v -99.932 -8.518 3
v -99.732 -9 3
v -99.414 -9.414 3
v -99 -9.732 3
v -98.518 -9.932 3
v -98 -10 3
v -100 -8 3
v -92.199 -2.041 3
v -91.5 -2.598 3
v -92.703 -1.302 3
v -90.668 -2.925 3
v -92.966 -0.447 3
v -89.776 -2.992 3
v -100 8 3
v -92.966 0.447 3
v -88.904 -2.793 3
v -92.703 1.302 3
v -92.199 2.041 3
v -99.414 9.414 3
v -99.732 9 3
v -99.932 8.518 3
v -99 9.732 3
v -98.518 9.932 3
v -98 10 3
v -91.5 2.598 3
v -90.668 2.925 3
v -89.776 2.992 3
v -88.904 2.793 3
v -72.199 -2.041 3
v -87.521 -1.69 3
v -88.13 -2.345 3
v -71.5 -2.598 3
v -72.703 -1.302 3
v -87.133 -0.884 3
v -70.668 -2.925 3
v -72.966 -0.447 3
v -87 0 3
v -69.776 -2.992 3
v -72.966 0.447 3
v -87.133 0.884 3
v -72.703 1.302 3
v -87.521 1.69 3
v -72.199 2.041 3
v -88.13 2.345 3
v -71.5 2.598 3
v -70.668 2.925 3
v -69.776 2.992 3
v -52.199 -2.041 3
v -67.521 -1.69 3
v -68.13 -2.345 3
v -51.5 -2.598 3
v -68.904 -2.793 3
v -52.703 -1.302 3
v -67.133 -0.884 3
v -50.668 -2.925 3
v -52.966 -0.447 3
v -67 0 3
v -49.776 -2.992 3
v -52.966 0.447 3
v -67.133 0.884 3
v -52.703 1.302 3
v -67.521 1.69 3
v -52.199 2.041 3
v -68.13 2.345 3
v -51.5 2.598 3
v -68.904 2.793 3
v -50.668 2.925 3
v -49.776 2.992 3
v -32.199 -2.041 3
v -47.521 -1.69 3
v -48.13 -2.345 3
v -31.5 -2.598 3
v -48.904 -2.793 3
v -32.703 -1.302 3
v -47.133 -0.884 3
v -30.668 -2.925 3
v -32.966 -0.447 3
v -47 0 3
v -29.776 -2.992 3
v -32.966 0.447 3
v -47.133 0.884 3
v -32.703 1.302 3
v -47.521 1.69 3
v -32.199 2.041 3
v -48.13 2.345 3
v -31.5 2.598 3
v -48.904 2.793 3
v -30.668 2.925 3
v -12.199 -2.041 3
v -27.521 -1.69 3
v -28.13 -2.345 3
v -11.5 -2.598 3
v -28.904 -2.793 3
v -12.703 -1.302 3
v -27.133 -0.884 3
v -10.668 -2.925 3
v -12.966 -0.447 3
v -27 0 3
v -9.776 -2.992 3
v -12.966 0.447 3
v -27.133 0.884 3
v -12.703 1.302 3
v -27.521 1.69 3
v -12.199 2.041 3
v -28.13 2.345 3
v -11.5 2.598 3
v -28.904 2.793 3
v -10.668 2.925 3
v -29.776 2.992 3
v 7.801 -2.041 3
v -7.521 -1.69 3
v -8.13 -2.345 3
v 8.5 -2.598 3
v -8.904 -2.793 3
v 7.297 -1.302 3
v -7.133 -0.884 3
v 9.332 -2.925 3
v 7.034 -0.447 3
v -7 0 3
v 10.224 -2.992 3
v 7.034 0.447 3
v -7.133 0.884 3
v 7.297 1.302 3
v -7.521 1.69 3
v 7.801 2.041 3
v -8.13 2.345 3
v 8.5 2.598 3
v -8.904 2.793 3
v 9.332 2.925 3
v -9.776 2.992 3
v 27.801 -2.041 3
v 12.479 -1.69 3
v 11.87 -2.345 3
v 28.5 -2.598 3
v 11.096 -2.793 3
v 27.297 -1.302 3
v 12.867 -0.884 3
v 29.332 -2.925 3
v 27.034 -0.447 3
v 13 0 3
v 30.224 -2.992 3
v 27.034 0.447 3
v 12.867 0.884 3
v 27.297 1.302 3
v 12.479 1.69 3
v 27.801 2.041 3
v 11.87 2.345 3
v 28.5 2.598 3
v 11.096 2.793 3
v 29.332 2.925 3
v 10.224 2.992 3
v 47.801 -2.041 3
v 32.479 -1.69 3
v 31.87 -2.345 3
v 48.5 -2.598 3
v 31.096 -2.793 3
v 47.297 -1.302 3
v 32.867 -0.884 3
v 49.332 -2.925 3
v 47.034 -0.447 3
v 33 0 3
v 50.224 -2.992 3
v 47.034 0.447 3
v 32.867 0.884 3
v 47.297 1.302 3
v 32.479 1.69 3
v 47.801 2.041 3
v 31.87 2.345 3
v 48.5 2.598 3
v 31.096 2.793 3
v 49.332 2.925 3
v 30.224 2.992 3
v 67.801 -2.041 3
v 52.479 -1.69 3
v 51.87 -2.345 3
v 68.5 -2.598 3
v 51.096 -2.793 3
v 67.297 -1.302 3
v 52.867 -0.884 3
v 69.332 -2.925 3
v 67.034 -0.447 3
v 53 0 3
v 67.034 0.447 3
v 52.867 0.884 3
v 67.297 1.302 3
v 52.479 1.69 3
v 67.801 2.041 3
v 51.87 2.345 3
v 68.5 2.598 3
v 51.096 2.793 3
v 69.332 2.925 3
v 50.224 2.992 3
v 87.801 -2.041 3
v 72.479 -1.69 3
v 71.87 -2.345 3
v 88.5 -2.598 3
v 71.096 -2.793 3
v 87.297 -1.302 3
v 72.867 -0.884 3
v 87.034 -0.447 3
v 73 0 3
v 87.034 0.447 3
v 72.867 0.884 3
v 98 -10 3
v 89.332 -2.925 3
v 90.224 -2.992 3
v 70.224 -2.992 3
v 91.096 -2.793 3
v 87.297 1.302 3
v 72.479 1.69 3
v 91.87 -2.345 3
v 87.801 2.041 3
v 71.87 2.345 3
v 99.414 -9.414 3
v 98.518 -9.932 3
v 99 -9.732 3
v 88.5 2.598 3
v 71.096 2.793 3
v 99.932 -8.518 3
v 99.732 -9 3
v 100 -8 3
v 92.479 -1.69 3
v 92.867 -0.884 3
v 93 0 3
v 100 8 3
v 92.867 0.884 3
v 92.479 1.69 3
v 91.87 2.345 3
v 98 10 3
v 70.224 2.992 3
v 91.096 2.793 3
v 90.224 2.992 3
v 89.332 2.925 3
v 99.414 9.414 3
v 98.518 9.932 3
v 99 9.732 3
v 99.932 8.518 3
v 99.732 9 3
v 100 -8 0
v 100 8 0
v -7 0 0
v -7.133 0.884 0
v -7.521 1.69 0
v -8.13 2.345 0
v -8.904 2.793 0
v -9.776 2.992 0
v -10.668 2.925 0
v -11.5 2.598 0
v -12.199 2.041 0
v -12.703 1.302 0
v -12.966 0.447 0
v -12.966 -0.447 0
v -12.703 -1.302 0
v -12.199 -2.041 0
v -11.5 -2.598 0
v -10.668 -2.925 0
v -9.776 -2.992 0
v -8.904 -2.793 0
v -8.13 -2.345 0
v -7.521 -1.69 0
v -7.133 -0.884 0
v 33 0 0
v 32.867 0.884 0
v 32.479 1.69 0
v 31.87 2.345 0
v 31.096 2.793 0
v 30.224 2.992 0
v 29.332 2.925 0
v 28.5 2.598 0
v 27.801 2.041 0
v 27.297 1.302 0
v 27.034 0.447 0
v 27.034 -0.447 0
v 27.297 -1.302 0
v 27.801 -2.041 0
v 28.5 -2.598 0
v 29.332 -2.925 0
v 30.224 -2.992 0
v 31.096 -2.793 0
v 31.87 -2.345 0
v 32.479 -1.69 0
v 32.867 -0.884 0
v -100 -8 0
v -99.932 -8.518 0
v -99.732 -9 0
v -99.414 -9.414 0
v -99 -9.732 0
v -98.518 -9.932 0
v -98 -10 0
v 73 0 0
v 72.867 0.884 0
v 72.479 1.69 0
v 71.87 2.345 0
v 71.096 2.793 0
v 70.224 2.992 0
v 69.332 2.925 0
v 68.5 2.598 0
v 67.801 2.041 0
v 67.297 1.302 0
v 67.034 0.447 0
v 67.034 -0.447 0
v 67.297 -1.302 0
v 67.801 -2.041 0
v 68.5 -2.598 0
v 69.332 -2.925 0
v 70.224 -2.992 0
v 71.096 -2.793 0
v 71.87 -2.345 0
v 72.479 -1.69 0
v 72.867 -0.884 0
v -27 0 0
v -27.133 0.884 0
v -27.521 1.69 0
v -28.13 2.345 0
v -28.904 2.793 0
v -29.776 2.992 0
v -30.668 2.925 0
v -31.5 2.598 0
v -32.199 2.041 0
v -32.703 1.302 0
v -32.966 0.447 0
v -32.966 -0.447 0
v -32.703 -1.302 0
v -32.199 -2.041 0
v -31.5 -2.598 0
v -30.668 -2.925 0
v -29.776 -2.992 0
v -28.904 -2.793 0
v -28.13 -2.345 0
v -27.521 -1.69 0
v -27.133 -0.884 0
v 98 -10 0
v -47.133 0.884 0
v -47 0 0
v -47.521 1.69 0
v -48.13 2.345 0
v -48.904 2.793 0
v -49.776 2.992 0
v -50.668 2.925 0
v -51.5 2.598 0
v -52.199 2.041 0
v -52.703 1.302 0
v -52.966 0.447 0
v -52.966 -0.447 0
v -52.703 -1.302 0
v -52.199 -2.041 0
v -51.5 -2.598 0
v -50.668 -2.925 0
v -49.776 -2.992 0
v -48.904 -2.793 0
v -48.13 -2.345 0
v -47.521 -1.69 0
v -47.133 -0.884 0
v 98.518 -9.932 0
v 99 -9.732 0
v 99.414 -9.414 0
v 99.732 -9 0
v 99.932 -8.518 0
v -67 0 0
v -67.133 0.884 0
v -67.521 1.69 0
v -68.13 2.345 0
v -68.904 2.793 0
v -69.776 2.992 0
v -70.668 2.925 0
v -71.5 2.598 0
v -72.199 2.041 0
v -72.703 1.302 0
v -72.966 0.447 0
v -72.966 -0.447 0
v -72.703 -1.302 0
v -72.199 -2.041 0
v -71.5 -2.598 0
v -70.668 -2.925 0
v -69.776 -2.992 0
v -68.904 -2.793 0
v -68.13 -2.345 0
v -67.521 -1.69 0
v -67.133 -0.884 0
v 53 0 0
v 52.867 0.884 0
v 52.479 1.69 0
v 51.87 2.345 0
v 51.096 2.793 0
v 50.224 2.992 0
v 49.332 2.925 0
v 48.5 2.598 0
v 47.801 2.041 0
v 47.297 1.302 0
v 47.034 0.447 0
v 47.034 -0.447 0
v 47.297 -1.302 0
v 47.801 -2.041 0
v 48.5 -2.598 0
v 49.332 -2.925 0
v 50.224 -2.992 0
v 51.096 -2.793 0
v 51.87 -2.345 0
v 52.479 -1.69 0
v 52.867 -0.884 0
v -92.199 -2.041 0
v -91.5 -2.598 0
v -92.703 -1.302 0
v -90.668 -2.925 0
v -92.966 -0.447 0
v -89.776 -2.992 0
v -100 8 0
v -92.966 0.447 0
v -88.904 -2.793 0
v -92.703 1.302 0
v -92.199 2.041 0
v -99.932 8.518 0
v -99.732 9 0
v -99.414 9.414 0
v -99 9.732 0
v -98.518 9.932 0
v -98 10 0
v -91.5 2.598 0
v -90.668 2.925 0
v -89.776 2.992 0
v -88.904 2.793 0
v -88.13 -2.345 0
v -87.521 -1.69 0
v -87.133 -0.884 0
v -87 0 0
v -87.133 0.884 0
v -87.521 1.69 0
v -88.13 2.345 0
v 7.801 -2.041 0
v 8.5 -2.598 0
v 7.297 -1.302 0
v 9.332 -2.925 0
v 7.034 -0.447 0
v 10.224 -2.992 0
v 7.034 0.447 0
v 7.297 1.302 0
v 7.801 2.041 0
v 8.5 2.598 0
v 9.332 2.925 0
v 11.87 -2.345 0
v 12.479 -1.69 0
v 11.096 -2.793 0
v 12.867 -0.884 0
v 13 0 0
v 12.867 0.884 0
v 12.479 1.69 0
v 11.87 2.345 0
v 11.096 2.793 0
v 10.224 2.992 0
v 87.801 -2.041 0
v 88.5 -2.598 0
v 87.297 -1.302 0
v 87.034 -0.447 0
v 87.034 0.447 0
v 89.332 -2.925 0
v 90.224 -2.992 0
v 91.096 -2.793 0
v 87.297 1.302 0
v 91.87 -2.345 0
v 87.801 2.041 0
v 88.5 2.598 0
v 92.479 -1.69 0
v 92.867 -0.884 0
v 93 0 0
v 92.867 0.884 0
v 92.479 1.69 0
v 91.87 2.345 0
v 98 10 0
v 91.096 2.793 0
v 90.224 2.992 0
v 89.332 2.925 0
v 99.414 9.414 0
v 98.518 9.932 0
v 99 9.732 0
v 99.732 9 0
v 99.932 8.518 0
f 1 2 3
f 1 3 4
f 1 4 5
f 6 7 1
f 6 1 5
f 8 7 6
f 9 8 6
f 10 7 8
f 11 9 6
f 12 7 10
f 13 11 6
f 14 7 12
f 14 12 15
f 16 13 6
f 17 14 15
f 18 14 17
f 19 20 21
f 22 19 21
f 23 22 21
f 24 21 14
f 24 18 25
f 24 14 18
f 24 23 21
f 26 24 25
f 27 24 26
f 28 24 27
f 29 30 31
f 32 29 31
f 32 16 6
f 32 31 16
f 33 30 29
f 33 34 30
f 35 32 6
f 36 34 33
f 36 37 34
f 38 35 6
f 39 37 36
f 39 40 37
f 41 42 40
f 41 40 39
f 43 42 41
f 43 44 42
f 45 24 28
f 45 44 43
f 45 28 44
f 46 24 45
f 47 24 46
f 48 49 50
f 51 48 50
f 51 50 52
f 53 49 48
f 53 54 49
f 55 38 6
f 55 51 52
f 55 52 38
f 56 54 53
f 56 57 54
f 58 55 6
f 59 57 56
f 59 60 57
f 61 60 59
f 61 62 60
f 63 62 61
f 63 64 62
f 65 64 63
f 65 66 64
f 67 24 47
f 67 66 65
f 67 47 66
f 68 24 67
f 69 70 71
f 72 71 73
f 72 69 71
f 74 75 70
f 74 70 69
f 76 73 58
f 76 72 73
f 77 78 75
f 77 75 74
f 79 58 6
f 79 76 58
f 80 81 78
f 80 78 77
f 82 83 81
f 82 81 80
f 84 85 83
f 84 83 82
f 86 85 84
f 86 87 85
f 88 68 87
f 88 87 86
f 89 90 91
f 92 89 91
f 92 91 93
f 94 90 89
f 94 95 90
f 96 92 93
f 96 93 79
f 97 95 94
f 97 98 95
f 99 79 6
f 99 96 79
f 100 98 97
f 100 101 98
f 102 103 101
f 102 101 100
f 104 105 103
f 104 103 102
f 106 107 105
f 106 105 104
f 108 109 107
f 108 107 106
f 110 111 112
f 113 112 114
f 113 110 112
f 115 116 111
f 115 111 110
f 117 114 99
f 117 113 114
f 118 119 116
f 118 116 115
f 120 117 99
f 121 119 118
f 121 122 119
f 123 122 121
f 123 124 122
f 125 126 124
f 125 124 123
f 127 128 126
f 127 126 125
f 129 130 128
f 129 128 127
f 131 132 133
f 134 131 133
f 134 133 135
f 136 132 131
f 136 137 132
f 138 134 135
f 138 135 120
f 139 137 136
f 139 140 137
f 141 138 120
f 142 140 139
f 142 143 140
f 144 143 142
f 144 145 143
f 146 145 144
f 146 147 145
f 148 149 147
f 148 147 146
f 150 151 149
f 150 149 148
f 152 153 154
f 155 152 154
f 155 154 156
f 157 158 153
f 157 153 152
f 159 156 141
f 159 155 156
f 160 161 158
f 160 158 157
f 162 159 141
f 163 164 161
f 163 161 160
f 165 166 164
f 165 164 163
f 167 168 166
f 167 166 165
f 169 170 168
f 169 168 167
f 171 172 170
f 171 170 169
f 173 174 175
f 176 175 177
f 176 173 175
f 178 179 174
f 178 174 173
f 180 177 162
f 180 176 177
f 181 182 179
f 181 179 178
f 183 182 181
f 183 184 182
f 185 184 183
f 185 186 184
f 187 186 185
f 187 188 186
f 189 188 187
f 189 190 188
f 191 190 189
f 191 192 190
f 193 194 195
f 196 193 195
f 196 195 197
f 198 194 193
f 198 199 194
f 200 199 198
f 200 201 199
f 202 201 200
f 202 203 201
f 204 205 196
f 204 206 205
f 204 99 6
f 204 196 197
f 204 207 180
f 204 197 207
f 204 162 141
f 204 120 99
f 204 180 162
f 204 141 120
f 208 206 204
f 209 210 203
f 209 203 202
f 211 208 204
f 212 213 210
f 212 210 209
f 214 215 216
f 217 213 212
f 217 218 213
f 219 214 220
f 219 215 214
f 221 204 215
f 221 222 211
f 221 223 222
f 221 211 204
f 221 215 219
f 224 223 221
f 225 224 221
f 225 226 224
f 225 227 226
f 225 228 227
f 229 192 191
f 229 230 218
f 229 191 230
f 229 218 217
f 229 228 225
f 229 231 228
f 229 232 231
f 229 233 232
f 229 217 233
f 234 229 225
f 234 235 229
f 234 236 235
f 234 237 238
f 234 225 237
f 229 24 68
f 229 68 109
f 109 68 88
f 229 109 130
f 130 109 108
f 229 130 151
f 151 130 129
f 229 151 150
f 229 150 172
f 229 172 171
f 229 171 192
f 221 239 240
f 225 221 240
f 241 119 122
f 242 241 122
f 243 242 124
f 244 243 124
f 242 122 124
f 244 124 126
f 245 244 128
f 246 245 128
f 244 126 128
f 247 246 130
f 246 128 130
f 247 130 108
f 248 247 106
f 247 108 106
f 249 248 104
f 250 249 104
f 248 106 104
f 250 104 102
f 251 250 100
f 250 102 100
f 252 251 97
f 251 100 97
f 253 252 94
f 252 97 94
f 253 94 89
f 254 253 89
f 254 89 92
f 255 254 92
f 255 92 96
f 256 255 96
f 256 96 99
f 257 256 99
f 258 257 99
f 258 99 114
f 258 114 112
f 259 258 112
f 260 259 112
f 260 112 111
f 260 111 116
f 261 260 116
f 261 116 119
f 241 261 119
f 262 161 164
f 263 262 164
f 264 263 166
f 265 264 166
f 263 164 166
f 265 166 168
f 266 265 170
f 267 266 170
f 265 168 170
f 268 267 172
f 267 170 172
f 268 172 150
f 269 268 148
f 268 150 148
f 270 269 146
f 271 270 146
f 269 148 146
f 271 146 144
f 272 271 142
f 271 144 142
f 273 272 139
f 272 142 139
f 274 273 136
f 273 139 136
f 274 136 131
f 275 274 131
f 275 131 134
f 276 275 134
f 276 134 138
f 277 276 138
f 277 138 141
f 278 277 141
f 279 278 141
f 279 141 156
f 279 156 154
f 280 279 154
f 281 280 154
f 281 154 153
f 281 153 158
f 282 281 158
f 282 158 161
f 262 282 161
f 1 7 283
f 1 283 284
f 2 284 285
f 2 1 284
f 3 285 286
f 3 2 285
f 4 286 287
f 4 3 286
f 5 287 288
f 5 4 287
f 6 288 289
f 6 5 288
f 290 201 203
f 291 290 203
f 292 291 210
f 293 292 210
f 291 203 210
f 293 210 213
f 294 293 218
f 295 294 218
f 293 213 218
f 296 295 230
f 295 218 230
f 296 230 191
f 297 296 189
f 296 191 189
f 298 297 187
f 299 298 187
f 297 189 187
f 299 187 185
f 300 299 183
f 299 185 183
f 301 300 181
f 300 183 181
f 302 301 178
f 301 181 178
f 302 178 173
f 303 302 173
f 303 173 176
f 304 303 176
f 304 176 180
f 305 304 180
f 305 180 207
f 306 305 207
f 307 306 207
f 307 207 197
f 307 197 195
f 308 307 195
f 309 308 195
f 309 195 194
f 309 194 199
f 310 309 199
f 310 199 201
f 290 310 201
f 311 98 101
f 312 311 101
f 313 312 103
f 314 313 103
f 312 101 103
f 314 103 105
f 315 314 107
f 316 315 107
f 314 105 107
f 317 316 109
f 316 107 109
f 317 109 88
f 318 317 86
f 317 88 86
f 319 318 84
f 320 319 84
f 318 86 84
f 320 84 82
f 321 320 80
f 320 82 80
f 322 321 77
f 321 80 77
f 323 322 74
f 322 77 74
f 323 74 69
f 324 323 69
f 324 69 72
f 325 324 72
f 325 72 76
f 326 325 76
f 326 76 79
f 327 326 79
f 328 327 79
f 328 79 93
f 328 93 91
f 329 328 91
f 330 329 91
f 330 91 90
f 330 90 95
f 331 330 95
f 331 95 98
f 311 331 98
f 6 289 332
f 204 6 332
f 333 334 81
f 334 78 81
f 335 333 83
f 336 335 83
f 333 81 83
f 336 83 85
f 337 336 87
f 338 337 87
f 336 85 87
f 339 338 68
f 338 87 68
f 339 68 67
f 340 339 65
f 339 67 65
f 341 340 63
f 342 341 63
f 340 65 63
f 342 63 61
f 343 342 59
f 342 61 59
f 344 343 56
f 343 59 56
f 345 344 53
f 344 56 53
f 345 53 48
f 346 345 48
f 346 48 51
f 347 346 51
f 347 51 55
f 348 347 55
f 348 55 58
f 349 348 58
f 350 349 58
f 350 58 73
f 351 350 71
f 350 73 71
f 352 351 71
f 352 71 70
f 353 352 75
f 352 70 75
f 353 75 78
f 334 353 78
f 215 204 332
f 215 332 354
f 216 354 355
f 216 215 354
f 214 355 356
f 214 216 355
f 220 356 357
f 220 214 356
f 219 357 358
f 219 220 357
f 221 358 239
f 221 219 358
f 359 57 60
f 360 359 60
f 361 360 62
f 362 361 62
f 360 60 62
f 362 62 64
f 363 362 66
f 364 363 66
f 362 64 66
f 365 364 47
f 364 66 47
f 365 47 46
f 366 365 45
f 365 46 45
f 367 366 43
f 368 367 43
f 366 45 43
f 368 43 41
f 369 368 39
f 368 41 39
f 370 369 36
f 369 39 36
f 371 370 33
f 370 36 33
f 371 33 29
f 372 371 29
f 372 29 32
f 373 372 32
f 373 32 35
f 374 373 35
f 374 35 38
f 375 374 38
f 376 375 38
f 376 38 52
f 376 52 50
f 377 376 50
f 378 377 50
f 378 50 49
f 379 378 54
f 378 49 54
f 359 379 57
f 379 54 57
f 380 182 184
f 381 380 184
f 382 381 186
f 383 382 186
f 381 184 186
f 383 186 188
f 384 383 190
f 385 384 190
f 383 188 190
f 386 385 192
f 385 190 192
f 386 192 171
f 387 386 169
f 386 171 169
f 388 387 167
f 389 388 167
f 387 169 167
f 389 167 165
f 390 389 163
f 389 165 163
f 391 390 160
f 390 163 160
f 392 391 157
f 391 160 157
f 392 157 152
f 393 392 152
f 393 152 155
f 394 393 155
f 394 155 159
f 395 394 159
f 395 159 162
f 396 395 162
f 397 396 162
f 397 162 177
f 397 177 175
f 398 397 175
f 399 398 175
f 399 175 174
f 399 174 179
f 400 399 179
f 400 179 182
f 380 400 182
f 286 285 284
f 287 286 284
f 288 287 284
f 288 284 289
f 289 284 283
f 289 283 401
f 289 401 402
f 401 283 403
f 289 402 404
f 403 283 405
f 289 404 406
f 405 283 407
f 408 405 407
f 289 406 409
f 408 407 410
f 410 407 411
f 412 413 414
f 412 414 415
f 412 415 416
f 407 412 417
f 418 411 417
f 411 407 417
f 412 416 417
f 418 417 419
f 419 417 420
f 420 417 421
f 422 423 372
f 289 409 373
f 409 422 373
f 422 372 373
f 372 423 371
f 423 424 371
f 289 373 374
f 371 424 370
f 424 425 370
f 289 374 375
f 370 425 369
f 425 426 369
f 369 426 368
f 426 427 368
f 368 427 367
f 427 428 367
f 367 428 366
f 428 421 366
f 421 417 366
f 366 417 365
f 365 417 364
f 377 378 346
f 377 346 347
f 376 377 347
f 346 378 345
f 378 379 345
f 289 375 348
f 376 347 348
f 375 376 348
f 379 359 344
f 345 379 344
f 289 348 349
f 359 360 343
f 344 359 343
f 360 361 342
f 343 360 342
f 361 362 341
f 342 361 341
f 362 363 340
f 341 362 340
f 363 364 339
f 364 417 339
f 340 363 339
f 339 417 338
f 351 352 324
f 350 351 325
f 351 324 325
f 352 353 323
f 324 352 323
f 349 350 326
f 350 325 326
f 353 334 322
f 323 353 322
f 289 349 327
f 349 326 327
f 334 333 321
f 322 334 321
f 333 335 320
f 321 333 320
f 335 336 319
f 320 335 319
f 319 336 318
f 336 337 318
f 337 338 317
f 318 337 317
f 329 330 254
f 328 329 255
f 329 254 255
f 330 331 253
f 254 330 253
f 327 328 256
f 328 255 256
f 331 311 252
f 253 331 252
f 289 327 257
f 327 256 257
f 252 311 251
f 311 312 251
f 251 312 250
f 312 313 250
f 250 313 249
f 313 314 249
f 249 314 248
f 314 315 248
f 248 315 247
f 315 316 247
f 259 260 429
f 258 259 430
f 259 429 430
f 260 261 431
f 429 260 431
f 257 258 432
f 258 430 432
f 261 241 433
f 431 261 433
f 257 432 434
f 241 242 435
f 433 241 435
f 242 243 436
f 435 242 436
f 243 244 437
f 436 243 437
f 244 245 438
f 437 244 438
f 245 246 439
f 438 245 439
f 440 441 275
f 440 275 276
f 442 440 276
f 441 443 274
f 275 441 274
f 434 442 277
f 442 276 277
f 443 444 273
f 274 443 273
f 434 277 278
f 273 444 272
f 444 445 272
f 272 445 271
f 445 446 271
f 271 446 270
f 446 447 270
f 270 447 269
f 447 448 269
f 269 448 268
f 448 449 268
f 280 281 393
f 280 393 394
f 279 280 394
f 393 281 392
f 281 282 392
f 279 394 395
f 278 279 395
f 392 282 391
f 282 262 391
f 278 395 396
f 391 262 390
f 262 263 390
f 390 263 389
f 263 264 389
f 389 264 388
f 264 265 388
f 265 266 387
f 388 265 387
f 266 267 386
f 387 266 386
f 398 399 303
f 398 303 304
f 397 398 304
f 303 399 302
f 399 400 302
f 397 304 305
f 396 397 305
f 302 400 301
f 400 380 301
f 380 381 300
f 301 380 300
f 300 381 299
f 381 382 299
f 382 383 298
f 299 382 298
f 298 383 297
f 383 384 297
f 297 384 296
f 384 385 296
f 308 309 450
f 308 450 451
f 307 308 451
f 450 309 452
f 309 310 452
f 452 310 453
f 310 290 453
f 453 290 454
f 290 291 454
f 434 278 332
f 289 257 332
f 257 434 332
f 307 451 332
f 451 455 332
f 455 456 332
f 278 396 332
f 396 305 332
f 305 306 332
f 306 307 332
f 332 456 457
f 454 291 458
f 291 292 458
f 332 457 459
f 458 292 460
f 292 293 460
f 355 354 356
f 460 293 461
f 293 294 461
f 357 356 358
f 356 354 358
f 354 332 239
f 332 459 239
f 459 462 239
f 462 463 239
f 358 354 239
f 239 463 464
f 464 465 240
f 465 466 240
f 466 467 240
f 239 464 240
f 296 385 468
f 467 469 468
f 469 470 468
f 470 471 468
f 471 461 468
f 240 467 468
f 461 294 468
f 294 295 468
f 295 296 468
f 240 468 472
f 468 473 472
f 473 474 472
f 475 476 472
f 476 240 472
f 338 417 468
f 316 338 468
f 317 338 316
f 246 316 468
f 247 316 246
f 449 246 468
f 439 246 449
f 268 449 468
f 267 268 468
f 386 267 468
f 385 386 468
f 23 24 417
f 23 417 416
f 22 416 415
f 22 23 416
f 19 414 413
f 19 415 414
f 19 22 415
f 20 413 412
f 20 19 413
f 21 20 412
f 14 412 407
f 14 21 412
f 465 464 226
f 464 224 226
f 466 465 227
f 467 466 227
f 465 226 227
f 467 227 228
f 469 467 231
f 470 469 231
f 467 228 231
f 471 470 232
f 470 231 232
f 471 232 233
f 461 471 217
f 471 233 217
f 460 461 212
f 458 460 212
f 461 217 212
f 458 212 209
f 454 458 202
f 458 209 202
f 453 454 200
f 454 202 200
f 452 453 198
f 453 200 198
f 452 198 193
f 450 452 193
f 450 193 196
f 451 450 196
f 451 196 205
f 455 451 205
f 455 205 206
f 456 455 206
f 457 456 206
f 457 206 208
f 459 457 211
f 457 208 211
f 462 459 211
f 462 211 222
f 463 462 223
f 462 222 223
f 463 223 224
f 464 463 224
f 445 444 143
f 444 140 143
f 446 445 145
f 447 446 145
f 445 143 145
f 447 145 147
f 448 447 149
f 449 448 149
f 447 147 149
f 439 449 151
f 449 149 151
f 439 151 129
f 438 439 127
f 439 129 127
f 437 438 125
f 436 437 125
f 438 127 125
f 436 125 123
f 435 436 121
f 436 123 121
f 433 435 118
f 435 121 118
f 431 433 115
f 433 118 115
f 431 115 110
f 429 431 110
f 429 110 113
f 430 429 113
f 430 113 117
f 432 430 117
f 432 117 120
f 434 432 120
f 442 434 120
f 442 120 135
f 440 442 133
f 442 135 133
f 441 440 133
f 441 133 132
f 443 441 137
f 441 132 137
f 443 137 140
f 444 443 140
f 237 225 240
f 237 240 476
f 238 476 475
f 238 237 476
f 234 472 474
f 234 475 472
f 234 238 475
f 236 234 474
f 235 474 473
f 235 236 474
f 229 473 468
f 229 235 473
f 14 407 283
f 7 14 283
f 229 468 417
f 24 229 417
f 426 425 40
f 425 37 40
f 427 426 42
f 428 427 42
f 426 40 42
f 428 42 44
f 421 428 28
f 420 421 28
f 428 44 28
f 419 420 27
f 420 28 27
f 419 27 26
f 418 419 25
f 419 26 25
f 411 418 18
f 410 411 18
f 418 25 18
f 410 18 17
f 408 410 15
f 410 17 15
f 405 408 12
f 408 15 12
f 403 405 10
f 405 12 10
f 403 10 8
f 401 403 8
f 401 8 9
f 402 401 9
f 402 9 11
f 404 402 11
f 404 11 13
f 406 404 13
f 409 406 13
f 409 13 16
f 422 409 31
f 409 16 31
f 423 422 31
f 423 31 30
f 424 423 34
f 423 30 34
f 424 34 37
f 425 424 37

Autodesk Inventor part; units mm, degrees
ref_plane "YZ Plane" through (0, 0, 0) normal (1, 0, 0) x (0, 1, 0)
ref_plane "XZ Plane" through (0, 0, 0) normal (0, 1, 0) x (-1, 0, 0)
ref_plane "XY Plane" through (0, 0, 0) normal (0, 0, 1) x (1, 0, 0)
sketch "Sketch1" plane through (0, 0, 0) normal (0, 0, 1) x (1, 0, 0)
  line L0 (-100, -10) -> (100, -10)
  line L1 (100, -10) -> (100, 10)
  line L2 (100, 10) -> (-100, 10)
  line L3 (-100, 10) -> (-100, -10)
  line L4 (-100, -10) -> (100, 10) construction
  line L5 (100, -10) -> (-100, 10) construction
  point P0 (0, 0)
  dimension "d0" = 200
  dimension "d1" = 20
extrude "Extrusion1" add sketch "Sketch1" along normal blind 3
sketch "Sketch2" plane through (0, 0, 3) normal (0, 0, 1) x (1, 0, 0)
  circle A0 centre (-90, 0) radius 3
  line L0 (-100, 10) -> (-100, -10) projected
  line L1 (100, 10) -> (-100, 10) projected
  point P0 (0, 0)
  dimension "d5" = 6
  dimension "d6" = 10
  dimension "d7" = 10
extrude "Extrusion2" cut sketch "Sketch2" against normal blind 3
pattern_linear "Rectangular Pattern1" count 10 spacing 20 along (1, 0, 0) of "Extrusion2"
fillet "Fillet1" radius 2 4 edges at (100, 10, 1.5) (100, -10, 1.5) (-100, -10, 1.5) (-100, 10, 1.5)
properties part number "Noi nhom 20100"
